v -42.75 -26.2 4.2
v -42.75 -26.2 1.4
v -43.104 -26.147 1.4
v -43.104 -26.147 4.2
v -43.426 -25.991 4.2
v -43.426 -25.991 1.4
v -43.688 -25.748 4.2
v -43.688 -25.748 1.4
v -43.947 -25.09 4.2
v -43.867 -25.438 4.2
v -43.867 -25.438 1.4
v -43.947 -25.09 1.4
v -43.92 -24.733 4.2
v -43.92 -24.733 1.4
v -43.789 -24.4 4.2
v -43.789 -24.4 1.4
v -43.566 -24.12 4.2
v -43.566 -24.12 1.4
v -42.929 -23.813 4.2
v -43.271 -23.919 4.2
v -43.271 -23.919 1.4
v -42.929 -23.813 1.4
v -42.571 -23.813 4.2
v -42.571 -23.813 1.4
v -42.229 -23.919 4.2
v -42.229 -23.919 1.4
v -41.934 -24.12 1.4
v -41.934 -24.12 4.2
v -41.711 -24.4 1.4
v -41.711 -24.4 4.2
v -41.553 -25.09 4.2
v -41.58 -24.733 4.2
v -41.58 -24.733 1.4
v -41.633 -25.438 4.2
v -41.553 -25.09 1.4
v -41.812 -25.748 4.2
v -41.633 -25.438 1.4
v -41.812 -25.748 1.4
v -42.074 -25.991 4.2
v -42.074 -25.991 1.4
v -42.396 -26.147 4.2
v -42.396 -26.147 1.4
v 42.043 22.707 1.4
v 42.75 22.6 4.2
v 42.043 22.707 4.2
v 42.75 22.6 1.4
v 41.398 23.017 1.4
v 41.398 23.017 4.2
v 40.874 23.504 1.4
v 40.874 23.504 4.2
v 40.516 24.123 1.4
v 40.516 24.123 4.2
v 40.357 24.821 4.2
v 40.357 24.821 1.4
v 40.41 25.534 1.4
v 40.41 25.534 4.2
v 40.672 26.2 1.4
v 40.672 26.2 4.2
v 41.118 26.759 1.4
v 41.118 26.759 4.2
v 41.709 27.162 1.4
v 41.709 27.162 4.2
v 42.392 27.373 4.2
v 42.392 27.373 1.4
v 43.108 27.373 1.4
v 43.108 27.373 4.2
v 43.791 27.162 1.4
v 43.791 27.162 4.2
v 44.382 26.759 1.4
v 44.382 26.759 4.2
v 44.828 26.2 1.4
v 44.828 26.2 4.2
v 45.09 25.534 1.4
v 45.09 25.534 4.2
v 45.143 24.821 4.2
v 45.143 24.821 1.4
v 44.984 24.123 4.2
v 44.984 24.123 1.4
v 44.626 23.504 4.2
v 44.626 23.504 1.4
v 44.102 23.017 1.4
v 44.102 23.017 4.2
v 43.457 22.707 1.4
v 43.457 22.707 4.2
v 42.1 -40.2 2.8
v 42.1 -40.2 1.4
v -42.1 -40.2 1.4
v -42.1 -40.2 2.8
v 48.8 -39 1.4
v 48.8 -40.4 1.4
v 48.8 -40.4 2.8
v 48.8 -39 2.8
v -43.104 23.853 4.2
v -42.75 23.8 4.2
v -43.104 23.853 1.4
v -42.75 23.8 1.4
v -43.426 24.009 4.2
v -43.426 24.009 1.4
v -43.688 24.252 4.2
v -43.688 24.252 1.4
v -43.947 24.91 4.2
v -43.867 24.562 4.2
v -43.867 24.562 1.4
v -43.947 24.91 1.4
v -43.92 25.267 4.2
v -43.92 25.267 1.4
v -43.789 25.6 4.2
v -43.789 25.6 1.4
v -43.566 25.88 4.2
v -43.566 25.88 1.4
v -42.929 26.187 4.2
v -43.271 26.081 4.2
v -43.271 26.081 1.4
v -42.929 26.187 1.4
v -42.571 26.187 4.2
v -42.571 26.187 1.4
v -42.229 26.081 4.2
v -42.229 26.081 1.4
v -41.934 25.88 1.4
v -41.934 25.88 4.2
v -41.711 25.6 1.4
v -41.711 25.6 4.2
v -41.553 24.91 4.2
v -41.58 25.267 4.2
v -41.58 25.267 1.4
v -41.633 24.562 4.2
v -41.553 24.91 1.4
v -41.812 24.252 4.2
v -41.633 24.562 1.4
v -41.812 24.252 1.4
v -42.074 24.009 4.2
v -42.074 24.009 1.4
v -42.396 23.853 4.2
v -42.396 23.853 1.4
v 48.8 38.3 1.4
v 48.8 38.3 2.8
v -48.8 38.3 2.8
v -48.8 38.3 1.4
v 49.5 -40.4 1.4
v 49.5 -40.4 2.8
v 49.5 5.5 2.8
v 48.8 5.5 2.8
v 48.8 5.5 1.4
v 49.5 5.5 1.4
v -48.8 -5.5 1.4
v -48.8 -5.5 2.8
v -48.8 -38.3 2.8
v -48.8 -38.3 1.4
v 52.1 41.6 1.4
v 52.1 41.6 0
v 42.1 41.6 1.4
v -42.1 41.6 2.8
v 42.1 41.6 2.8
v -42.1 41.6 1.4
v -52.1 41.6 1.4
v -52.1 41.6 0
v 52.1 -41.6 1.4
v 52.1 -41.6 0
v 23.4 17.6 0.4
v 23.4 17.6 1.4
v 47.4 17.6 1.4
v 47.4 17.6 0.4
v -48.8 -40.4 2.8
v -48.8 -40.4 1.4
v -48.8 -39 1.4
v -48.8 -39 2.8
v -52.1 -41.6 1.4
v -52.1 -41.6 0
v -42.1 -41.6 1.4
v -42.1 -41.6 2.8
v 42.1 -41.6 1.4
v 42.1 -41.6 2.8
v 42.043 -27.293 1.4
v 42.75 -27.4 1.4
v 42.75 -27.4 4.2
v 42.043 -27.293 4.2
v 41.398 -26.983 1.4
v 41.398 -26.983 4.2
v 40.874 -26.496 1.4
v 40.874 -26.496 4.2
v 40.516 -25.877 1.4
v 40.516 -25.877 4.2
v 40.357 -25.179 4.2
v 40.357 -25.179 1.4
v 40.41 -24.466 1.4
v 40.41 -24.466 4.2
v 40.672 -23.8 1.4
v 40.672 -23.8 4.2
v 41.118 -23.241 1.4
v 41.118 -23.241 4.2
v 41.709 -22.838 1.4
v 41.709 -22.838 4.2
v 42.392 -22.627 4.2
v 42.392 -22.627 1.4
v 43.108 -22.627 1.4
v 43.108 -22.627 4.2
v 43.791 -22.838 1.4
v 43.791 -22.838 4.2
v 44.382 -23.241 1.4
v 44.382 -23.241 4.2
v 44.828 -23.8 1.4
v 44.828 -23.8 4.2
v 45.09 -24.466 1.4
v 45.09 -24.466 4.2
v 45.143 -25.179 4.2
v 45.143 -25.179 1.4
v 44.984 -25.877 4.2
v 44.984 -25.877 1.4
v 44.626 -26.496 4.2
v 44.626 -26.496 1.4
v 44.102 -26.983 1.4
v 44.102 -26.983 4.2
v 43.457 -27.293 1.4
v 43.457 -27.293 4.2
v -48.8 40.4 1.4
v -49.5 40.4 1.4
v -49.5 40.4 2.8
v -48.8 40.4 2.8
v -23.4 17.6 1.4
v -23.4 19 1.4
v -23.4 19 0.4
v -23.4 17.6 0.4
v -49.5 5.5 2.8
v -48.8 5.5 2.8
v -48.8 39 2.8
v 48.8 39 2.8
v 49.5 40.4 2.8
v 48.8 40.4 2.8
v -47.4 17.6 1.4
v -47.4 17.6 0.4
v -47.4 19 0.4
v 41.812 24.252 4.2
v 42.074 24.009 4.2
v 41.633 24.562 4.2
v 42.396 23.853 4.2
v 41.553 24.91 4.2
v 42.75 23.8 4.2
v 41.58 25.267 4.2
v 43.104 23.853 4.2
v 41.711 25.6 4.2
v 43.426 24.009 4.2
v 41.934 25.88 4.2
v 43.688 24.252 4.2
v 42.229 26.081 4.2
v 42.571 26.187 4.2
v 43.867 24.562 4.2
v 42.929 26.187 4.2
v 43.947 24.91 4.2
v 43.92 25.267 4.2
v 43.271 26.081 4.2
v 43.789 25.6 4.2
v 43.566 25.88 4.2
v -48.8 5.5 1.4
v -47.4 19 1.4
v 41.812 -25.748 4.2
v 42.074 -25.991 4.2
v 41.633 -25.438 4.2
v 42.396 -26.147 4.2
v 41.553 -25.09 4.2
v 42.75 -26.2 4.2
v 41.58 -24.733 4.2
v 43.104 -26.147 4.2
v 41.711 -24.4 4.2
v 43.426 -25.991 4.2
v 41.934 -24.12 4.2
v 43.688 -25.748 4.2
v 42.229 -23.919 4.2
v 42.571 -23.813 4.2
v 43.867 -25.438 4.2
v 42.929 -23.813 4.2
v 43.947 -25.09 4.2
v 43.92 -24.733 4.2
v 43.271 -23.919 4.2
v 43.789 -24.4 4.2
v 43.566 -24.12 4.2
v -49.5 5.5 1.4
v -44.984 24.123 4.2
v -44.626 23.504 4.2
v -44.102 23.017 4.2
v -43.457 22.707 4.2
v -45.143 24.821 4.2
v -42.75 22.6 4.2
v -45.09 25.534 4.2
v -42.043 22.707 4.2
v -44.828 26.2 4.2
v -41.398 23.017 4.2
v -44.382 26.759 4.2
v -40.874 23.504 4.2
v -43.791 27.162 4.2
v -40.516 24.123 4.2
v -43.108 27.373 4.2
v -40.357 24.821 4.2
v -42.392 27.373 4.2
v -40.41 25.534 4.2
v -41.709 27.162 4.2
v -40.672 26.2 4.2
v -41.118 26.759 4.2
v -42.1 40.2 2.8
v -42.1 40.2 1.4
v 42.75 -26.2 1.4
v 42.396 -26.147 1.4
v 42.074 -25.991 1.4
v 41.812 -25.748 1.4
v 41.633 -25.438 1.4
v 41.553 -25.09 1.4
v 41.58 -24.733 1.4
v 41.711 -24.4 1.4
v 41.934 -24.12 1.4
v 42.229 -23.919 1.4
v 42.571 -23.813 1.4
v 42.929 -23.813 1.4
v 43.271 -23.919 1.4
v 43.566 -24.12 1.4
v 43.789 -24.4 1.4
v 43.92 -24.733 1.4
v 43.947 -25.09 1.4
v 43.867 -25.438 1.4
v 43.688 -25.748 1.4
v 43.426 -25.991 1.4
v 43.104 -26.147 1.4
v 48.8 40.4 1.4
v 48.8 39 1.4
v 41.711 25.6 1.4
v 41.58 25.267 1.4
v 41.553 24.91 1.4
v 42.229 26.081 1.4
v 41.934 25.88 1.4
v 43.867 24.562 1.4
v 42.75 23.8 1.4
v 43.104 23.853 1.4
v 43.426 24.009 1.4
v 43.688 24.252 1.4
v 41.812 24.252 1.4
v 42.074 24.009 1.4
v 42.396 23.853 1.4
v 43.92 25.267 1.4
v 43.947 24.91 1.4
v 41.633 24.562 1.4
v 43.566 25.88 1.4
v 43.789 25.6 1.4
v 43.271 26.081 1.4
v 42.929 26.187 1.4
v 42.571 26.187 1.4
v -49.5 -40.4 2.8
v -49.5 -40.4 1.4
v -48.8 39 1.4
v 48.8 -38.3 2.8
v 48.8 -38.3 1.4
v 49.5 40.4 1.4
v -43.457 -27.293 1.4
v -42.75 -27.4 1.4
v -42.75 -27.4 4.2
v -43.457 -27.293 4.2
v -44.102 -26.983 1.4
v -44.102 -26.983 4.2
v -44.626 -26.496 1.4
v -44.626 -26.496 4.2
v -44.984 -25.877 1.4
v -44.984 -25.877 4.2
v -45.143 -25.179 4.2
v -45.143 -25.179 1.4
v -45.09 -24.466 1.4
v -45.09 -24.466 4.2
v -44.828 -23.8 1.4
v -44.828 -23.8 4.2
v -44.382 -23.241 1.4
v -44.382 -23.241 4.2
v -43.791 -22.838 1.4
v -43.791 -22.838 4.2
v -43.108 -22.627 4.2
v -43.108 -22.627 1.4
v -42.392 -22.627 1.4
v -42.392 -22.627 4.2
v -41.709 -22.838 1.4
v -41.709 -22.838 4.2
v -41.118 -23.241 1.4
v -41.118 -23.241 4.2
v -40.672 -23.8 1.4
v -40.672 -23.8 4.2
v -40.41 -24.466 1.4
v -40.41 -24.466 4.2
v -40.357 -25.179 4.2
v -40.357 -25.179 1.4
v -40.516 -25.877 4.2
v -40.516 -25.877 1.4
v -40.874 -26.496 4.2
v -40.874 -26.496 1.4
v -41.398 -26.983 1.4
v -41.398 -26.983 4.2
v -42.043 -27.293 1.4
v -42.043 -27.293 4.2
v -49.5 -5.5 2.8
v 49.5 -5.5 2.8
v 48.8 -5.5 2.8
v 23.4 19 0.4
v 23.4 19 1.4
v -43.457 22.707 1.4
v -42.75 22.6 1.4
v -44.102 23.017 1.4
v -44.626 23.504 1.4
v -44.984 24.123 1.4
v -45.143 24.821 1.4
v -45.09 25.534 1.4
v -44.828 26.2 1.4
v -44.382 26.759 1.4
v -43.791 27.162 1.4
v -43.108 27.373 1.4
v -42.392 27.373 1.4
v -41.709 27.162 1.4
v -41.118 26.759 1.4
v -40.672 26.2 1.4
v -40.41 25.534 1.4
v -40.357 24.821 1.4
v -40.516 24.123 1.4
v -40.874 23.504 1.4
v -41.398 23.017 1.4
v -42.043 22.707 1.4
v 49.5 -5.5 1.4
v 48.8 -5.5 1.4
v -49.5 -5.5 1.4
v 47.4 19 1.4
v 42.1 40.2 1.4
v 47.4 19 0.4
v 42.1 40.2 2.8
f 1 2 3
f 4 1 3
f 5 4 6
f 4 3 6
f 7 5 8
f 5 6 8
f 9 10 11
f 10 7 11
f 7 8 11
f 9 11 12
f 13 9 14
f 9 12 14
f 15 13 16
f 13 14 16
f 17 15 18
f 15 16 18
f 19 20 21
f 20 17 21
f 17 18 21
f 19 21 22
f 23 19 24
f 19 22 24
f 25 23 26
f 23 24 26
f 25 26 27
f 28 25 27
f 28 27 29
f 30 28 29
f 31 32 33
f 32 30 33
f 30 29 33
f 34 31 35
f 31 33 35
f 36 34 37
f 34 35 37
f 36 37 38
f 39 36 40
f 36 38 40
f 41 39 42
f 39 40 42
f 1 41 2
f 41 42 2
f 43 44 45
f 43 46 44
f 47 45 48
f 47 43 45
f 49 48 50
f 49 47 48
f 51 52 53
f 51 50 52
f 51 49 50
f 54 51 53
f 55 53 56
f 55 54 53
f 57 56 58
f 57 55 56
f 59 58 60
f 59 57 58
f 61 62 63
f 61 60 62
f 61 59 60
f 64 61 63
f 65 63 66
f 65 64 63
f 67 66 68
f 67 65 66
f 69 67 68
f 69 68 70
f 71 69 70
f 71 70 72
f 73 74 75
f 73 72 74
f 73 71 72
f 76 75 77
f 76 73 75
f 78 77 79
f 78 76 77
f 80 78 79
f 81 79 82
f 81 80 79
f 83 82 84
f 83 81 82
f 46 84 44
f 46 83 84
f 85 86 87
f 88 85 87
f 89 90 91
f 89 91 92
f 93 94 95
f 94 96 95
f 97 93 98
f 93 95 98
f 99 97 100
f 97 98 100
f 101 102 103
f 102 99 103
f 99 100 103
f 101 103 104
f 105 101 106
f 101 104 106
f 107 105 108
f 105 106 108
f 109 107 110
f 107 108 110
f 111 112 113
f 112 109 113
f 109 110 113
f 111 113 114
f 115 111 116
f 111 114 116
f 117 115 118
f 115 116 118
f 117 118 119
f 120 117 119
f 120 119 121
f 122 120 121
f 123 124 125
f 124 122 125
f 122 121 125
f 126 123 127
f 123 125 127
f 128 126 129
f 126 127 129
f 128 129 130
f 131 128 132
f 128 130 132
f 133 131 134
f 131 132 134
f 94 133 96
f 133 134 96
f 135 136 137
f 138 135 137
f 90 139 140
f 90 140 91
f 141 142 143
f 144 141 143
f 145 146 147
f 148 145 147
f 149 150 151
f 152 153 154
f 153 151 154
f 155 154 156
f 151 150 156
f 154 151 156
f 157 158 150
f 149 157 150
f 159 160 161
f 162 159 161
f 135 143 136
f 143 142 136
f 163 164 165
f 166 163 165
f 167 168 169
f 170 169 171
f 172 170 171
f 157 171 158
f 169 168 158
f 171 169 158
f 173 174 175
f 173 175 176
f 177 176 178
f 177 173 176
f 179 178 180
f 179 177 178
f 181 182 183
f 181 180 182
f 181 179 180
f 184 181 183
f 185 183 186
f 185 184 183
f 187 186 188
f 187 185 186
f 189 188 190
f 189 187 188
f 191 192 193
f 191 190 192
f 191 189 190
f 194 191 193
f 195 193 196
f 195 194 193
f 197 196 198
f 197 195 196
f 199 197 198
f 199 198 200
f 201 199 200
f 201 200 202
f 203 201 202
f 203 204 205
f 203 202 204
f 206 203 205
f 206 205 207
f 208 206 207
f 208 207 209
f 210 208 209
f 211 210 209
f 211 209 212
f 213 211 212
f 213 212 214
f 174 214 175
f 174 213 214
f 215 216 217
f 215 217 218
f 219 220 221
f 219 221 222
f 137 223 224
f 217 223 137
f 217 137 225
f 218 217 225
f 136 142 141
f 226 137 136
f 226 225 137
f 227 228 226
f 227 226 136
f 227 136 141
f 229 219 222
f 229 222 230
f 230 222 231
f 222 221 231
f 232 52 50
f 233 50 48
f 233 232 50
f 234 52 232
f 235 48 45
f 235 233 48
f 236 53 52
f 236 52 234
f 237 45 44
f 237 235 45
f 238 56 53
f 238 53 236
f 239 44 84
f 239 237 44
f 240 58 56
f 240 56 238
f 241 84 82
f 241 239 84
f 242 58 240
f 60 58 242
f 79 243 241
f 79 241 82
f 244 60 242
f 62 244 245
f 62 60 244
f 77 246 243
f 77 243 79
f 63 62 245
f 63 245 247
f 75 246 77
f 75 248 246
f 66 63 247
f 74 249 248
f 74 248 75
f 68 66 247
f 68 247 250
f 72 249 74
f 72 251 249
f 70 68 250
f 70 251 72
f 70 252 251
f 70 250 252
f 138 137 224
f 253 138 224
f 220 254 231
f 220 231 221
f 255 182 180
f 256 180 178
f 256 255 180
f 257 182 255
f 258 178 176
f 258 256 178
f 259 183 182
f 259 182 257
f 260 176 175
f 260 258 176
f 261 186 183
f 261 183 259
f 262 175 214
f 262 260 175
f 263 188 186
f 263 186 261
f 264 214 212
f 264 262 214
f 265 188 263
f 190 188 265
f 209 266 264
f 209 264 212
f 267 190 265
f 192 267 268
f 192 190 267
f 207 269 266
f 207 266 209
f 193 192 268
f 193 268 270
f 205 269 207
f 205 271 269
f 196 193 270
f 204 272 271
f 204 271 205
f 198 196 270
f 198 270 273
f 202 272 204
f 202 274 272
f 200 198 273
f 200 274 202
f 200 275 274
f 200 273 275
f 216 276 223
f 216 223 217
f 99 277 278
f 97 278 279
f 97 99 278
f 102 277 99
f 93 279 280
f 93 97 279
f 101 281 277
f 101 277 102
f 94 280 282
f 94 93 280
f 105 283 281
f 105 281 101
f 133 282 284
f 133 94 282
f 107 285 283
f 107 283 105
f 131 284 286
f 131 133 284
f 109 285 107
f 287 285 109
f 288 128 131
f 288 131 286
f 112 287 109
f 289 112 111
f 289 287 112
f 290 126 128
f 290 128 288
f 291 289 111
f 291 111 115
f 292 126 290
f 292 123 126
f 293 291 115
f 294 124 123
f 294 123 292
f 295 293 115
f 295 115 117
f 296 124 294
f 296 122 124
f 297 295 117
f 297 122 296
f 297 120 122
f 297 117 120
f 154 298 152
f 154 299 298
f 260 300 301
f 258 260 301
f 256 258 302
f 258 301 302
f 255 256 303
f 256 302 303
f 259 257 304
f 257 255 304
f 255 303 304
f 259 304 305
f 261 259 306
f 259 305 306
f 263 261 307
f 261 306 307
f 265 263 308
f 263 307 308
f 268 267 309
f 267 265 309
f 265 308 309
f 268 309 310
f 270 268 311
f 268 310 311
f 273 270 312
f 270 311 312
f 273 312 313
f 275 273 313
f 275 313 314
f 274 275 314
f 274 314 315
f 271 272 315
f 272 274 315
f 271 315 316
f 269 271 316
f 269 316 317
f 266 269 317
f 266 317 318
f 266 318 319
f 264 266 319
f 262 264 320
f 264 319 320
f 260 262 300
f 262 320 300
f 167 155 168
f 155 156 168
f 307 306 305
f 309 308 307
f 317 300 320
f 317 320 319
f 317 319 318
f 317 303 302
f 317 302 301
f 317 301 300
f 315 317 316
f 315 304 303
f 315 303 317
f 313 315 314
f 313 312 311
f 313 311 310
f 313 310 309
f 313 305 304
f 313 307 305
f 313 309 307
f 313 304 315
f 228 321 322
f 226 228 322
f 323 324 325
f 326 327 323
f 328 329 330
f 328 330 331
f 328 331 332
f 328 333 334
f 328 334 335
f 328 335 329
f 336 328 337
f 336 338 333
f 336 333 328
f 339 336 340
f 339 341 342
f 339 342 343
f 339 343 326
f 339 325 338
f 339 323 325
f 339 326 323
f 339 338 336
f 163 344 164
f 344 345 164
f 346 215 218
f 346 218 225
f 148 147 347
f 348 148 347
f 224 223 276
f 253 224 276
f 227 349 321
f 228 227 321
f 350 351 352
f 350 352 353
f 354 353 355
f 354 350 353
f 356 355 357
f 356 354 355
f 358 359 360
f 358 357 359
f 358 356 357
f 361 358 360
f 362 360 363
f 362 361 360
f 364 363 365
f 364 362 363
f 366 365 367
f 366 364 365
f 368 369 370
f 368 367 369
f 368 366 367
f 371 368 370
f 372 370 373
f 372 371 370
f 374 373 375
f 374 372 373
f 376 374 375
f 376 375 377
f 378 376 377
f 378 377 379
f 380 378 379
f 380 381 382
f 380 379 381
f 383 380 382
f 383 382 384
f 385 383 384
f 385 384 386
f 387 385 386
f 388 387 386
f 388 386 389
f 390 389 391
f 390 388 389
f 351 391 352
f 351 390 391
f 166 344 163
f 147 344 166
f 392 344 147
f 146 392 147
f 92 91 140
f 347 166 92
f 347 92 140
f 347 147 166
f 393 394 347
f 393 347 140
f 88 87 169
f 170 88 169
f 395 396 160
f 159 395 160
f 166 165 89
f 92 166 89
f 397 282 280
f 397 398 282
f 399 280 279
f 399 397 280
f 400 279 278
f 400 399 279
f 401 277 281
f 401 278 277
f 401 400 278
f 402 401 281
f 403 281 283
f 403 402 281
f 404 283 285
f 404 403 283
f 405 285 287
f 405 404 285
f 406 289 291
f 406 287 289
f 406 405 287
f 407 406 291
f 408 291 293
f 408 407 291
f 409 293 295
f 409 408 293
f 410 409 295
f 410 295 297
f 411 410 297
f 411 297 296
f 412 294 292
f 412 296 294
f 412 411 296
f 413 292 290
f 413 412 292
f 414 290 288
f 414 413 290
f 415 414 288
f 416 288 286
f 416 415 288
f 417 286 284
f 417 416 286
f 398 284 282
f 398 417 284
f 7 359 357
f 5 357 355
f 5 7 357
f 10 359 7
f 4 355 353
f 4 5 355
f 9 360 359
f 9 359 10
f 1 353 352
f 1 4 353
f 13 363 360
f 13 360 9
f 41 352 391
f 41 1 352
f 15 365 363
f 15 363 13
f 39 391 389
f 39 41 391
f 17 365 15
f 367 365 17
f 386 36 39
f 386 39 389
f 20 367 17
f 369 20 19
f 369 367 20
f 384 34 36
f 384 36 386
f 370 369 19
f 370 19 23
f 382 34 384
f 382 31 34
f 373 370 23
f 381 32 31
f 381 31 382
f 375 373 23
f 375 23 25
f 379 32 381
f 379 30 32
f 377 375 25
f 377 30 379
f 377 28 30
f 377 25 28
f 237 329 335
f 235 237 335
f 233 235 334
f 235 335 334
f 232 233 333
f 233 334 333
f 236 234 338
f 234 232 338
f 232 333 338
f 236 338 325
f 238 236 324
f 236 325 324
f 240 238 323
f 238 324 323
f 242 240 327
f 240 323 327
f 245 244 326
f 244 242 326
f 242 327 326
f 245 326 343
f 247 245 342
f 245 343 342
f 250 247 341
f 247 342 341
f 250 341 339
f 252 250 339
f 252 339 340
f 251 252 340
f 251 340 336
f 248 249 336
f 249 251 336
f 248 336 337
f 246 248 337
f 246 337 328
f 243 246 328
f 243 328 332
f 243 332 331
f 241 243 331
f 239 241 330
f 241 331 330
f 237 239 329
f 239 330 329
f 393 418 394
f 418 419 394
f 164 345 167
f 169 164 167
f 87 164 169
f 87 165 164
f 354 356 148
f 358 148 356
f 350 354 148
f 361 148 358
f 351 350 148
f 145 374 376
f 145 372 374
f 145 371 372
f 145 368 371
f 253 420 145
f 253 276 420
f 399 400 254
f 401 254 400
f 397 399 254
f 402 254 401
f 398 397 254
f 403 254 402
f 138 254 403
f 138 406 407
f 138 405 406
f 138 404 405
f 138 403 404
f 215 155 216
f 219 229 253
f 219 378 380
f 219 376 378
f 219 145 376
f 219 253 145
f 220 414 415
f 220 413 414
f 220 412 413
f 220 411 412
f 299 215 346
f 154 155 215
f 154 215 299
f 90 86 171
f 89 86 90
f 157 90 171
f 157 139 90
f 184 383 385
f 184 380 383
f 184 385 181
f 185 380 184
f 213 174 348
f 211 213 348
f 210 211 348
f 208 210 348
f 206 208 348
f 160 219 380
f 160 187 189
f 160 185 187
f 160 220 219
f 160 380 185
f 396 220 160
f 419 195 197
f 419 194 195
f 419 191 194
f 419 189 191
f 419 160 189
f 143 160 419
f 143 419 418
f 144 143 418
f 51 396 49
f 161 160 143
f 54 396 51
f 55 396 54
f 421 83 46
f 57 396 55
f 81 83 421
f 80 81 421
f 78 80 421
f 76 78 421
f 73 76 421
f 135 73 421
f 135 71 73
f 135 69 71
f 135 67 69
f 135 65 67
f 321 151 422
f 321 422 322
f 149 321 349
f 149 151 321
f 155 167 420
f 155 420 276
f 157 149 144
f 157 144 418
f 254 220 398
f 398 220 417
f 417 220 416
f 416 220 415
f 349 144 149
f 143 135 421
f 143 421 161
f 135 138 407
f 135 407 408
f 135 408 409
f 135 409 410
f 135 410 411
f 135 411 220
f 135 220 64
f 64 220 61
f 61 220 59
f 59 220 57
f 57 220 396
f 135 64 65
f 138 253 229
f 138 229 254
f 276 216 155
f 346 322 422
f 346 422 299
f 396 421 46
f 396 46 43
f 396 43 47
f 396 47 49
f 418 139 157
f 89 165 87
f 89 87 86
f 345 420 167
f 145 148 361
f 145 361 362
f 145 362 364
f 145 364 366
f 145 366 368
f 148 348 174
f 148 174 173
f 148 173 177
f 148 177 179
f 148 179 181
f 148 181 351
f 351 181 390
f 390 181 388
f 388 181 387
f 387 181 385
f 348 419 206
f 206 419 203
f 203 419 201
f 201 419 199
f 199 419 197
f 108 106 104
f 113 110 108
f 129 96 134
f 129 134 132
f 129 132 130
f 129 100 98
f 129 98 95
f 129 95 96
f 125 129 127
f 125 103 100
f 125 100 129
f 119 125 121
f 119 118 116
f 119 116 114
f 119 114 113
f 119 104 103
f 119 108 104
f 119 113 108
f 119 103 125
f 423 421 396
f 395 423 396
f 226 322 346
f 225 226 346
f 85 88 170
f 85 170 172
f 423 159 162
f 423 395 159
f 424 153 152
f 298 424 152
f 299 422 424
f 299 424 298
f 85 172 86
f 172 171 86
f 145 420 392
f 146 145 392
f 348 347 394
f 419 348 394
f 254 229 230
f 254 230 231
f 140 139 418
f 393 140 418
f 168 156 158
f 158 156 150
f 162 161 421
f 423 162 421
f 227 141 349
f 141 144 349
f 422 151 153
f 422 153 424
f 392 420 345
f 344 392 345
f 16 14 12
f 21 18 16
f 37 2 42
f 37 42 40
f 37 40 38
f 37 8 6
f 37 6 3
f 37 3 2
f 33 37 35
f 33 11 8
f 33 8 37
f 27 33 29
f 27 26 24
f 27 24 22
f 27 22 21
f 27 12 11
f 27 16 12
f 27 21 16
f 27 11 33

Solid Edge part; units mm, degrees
sketch "Sketch1" plane through (0, 0, 0) normal (0, 0, 1) x (1, 0, 0)
  line L0 (49.5, -39) -> (49.5, 39)
  line L1 (49.5, 39) -> (-49.5, 39)
  line L2 (-49.5, 39) -> (-49.5, -39)
  line L3 (-49.5, -39) -> (49.5, -39)
extrude "Protrusion1" add sketch "Sketch1" along normal blind 2.8
sketch "Sketch2" plane through (0, 0, 2.8) normal (0, 0, 1) x (-1, 0, 0)
  line L0 (48.8, -38.3) -> (48.8, 38.3)
  line L1 (48.8, 38.3) -> (-48.8, 38.3)
  line L2 (-48.8, 38.3) -> (-48.8, -38.3)
  line L3 (-48.8, -38.3) -> (48.8, -38.3)
extrude "VaciadoExtruido_1" cut sketch "Sketch2" against normal blind 1.4
sketch "Sketch3" plane through (-49.5, 0, 1.4) normal (-1, 0, 0) x (0, -1, 0)
  line L0 (5.5, 2.8) -> (-5.5, 2.8)
  line L1 (-5.5, 2.8) -> (-5.5, 0)
  line L2 (-5.5, 0) -> (5.5, 0)
  line L3 (5.5, 0) -> (5.5, 2.8)
extrude "VaciadoExtruido_2" cut sketch "Sketch3" against normal blind 100.11
sketch "Sketch4" plane through (0, 0, 1.4) normal (0, 0, 1) x (0, -1, 0)
  circle A0 centre (-25, 42.75) radius 2.4
  circle A1 centre (25, 42.75) radius 2.4
  circle A2 centre (25, -42.75) radius 2.4
  circle A3 centre (-25, -42.75) radius 2.4
  dimension "D1" = 6.75
  dimension "D2" = 14
extrude "ProtrusiónExtruida_2" add sketch "Sketch4" along normal blind 2.8
sketch "Sketch5" plane through (0, 0, 1.4) normal (0, 0, 1) x (0, -1, 0)
  circle A0 centre (25, 42.75) radius 1.2
  circle A1 centre (-25, 42.75) radius 1.2
  circle A2 centre (-25, -42.75) radius 1.2
  circle A3 centre (25, -42.75) radius 1.2
extrude "VaciadoExtruido_4" cut sketch "Sketch5" along normal blind 2.8
sketch "Sketch6" plane through (0, 0, 1.4) normal (0, 0, 1) x (0, -1, 0)
  line L0 (-19, -47.4) -> (-19, -23.4)
  line L1 (-19, -23.4) -> (-17.6, -23.4)
  line L2 (-17.6, -23.4) -> (-17.6, -47.4)
  line L3 (-17.6, -47.4) -> (-19, -47.4)
  line L4 (-17.6, 23.4) -> (-17.6, 47.4)
  line L5 (-17.6, 47.4) -> (-19, 47.4)
  line L6 (-19, 47.4) -> (-19, 23.4)
  line L7 (-19, 23.4) -> (-17.6, 23.4)
  dimension "D1" = 1.4
  dimension "D2" = 20
  dimension "D3" = 1.4
  dimension "D4" = 24
extrude "VaciadoExtruido_5" cut sketch "Sketch6" against normal blind 1
sketch "Sketch7" plane through (0, 0, 0) normal (0, 0, 1) x (1, 0, 0)
  line L0 (-49.5, -39) -> (49.5, -39)
  line L1 (49.5, -39) -> (49.5, 39)
  line L2 (49.5, 39) -> (-49.5, 39)
  line L3 (-49.5, 39) -> (-49.5, -39)
  line L4 (52.1, -41.6) -> (52.1, 41.6)
  line L5 (52.1, 41.6) -> (-52.1, 41.6)
  line L6 (-52.1, 41.6) -> (-52.1, -41.6)
  line L7 (-52.1, -41.6) -> (52.1, -41.6)
extrude "ProtrusiónExtruida_3" add sketch "Sketch7" along normal blind 1.4
sketch "Sketch8" plane through (0, 0, 1.4) normal (0, 0, 1) x (0, 1, 0)
  line L0 (-39, -49.5) -> (-40.4, -49.5)
  line L1 (-40.4, -49.5) -> (-40.4, -48.8)
  line L2 (-40.4, -48.8) -> (-39, -48.8)
  line L3 (-39, -48.8) -> (-39, -49.5)
  line L4 (-41.6, 42.1) -> (-41.6, -42.1)
  line L5 (-41.6, -42.1) -> (-40.2, -42.1)
  line L6 (-40.2, -42.1) -> (-40.2, 42.1)
  line L7 (-40.2, 42.1) -> (-41.6, 42.1)
  line L8 (-40.4, 48.8) -> (-39, 48.8)
  line L9 (-39, 48.8) -> (-39, 49.5)
  line L10 (-39, 49.5) -> (-40.4, 49.5)
  line L11 (-40.4, 49.5) -> (-40.4, 48.8)
  line L12 (40.4, 48.8) -> (39, 48.8)
  line L13 (39, 48.8) -> (39, 49.5)
  line L14 (39, 49.5) -> (40.4, 49.5)
  line L15 (40.4, 49.5) -> (40.4, 48.8)
  line L16 (40.2, -42.1) -> (40.2, 42.1)
  line L17 (40.2, 42.1) -> (41.6, 42.1)
  line L18 (41.6, 42.1) -> (41.6, -42.1)
  line L19 (41.6, -42.1) -> (40.2, -42.1)
  line L20 (39, -49.5) -> (40.4, -49.5)
  line L21 (40.4, -49.5) -> (40.4, -48.8)
  line L22 (40.4, -48.8) -> (39, -48.8)
  line L23 (39, -48.8) -> (39, -49.5)
  dimension "D1" = 10
  dimension "D2" = 10
  dimension "D3" = 1.4
  dimension "D4" = 1.4
extrude "ProtrusiónExtruida_4" add sketch "Sketch8" along normal blind 1.4
